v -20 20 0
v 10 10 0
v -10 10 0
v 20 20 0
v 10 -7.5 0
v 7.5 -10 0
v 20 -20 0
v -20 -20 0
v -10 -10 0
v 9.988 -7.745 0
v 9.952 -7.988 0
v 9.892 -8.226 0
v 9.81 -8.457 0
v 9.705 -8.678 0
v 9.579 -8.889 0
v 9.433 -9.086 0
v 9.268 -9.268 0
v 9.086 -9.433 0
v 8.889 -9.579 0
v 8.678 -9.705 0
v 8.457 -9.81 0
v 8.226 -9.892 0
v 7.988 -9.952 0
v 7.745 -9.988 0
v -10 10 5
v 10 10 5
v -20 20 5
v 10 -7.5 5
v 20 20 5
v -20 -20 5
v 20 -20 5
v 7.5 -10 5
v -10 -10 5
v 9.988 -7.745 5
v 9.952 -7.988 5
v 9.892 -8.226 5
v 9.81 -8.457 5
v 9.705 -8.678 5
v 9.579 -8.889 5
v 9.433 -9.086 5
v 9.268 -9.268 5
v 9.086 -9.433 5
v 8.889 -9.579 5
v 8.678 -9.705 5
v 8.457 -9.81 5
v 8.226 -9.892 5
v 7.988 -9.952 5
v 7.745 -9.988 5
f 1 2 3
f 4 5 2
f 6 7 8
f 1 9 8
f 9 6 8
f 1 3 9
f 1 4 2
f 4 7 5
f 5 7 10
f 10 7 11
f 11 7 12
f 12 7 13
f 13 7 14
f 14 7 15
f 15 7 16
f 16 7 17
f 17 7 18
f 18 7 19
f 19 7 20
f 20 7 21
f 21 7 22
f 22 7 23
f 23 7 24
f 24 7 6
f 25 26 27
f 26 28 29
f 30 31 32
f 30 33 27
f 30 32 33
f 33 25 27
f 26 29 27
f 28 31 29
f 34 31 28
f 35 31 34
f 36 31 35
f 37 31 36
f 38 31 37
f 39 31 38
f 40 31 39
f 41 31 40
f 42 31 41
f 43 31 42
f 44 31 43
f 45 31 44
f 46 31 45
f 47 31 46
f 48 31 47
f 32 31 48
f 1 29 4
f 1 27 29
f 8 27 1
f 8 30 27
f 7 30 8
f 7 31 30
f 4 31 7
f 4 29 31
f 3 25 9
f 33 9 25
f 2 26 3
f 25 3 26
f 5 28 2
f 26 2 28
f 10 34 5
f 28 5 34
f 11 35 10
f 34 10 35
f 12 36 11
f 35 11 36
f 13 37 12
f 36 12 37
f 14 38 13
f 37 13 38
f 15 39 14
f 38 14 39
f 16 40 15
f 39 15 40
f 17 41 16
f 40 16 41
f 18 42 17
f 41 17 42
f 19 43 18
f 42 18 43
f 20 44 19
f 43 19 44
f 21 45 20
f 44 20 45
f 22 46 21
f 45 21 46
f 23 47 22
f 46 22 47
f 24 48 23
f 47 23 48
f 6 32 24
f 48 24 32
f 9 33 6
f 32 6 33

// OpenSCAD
module SqareExample(){
  color("navy")linear_extrude(height=5)difference(){
        translate([-20, -20, 0])square([40, 40]);
        translate([-10, -10, 0])union()union(){
              translate([2.5, 2.5, 0])hull(){
                  circle(d=5,$fn=64);
                  translate([15, 0, 0])circle(d=5,$fn=64);
                  translate([0, 15, 0])circle(d=5,$fn=64);
                  translate([15, 15, 0])circle(d=5,$fn=64);
                }

              translate([0, 10, 0])square([20, 10]);
              square([10, 20]);
            }

      }
}
$fn=64;
SqareExample();
